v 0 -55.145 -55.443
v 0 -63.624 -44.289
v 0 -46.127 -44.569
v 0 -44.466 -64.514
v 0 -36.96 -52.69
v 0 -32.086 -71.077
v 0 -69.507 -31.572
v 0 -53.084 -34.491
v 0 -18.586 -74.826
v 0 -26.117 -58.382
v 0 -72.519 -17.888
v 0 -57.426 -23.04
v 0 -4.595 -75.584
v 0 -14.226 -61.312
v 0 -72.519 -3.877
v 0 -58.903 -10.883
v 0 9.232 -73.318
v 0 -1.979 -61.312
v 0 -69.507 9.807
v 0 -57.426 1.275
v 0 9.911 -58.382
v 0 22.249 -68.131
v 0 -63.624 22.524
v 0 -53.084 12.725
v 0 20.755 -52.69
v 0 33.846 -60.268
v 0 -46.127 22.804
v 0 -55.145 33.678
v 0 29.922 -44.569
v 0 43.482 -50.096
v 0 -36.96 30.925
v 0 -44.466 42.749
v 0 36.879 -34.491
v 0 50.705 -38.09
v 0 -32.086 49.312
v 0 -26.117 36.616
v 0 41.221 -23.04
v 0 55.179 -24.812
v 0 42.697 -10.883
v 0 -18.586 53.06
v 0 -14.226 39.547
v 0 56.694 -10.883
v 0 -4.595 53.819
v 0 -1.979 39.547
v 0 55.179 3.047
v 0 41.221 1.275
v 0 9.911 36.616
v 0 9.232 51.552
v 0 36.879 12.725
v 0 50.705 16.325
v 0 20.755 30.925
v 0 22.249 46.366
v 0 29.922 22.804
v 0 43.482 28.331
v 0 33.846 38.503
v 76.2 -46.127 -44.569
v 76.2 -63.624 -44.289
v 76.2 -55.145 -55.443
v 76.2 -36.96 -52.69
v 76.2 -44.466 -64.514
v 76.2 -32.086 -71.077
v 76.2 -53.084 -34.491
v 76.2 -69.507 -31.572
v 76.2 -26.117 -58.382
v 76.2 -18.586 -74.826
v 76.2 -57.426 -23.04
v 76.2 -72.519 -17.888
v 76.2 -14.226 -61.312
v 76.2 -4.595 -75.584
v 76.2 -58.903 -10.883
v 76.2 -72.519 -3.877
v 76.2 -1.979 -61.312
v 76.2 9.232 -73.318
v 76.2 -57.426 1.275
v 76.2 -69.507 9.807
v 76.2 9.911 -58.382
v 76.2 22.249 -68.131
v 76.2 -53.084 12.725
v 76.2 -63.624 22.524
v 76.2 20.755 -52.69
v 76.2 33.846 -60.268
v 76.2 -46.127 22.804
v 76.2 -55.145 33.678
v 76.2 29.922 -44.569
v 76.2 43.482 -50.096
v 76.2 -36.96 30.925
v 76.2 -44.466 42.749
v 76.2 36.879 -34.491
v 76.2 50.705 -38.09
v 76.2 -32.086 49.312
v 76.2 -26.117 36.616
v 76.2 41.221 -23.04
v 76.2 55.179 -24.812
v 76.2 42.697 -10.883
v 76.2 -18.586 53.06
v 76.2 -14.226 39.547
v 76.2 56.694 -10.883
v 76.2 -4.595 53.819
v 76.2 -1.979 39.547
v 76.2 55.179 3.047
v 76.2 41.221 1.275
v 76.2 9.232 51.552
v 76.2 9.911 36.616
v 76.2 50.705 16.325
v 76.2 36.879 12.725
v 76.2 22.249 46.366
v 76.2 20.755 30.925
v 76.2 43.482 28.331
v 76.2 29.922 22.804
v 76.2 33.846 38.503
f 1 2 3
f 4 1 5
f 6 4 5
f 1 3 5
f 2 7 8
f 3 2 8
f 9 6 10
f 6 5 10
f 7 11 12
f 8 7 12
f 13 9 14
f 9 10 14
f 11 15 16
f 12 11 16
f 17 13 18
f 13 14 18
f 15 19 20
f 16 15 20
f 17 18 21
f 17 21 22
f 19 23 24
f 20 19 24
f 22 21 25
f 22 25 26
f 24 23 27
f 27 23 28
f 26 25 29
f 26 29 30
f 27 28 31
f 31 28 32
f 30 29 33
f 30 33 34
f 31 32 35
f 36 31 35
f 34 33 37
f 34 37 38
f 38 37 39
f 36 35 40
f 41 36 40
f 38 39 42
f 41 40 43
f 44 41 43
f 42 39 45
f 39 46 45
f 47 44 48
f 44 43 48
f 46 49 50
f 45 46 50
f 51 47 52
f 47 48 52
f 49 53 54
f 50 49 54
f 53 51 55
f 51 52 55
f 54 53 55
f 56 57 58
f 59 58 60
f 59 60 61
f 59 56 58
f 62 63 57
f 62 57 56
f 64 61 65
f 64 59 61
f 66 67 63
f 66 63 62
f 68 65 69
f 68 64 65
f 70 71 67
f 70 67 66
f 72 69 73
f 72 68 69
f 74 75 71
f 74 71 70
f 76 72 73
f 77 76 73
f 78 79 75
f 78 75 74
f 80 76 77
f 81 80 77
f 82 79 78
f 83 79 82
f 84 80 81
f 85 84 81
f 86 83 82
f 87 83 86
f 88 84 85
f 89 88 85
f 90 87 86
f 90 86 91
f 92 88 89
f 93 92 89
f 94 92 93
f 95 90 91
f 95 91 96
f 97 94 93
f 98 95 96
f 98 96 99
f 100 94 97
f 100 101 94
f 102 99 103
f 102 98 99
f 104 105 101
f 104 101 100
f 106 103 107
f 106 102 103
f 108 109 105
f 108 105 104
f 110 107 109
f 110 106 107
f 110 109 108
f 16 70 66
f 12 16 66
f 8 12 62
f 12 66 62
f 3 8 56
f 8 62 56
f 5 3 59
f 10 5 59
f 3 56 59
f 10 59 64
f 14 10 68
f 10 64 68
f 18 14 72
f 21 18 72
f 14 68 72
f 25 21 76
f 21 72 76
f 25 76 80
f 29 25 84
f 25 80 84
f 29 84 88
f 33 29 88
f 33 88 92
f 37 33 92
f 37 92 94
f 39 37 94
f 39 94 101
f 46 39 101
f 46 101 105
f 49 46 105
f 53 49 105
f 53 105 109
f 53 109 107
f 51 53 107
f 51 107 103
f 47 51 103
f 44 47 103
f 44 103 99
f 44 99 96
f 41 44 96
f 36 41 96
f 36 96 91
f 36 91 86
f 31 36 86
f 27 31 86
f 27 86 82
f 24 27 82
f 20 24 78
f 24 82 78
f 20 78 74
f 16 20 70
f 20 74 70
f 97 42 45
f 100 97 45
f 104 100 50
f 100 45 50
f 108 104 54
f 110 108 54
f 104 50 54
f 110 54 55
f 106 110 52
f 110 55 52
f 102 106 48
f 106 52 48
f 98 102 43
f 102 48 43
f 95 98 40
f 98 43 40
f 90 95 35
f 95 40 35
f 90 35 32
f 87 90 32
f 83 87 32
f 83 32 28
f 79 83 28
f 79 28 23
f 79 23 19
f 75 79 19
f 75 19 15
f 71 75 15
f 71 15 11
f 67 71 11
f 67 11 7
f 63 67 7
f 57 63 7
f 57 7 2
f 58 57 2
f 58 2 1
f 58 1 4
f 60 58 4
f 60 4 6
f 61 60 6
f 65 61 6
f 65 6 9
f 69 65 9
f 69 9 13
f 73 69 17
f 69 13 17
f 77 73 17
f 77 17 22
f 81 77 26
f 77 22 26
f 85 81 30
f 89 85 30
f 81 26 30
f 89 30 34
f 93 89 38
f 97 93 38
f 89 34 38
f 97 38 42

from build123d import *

# Parameters (mm, degrees)
F0_R     = 64.7966982458
F1_DEPTH = 76.2
F2_DEPTH = 25.4
F3_D     = 101.6
F3_DEPTH = 127
F3_TIP   = 30.5237194466


with BuildPart() as f1:
    # F0 (on Right) → F1 (new body)
    with BuildSketch(Plane.YZ):
        with Locations((-8.1026245671, -10.8826834557)):
            Circle(F0_R)
    extrude(amount=F1_DEPTH)

    # F0 (on Right) → F2 (join)
    with BuildSketch(Plane.YZ):
        with Locations((-8.1026245671, -10.8826834557)):
            Circle(F0_R)
    extrude(amount=F2_DEPTH)

    # F3
    with Locations(Plane(origin=(0, 0, 0), x_dir=(0, 1, 0), z_dir=(-1, 0, 0))):
        with Locations((-8.1026245671, 10.8826834557)):
            Hole(F3_D / 2, depth=F3_DEPTH)
            with Locations((0, 0, -(F3_DEPTH + F3_TIP / 2))):  # 118° drill point
                Cone(0, F3_D / 2, F3_TIP, mode=Mode.SUBTRACT)


solid = f1.part
